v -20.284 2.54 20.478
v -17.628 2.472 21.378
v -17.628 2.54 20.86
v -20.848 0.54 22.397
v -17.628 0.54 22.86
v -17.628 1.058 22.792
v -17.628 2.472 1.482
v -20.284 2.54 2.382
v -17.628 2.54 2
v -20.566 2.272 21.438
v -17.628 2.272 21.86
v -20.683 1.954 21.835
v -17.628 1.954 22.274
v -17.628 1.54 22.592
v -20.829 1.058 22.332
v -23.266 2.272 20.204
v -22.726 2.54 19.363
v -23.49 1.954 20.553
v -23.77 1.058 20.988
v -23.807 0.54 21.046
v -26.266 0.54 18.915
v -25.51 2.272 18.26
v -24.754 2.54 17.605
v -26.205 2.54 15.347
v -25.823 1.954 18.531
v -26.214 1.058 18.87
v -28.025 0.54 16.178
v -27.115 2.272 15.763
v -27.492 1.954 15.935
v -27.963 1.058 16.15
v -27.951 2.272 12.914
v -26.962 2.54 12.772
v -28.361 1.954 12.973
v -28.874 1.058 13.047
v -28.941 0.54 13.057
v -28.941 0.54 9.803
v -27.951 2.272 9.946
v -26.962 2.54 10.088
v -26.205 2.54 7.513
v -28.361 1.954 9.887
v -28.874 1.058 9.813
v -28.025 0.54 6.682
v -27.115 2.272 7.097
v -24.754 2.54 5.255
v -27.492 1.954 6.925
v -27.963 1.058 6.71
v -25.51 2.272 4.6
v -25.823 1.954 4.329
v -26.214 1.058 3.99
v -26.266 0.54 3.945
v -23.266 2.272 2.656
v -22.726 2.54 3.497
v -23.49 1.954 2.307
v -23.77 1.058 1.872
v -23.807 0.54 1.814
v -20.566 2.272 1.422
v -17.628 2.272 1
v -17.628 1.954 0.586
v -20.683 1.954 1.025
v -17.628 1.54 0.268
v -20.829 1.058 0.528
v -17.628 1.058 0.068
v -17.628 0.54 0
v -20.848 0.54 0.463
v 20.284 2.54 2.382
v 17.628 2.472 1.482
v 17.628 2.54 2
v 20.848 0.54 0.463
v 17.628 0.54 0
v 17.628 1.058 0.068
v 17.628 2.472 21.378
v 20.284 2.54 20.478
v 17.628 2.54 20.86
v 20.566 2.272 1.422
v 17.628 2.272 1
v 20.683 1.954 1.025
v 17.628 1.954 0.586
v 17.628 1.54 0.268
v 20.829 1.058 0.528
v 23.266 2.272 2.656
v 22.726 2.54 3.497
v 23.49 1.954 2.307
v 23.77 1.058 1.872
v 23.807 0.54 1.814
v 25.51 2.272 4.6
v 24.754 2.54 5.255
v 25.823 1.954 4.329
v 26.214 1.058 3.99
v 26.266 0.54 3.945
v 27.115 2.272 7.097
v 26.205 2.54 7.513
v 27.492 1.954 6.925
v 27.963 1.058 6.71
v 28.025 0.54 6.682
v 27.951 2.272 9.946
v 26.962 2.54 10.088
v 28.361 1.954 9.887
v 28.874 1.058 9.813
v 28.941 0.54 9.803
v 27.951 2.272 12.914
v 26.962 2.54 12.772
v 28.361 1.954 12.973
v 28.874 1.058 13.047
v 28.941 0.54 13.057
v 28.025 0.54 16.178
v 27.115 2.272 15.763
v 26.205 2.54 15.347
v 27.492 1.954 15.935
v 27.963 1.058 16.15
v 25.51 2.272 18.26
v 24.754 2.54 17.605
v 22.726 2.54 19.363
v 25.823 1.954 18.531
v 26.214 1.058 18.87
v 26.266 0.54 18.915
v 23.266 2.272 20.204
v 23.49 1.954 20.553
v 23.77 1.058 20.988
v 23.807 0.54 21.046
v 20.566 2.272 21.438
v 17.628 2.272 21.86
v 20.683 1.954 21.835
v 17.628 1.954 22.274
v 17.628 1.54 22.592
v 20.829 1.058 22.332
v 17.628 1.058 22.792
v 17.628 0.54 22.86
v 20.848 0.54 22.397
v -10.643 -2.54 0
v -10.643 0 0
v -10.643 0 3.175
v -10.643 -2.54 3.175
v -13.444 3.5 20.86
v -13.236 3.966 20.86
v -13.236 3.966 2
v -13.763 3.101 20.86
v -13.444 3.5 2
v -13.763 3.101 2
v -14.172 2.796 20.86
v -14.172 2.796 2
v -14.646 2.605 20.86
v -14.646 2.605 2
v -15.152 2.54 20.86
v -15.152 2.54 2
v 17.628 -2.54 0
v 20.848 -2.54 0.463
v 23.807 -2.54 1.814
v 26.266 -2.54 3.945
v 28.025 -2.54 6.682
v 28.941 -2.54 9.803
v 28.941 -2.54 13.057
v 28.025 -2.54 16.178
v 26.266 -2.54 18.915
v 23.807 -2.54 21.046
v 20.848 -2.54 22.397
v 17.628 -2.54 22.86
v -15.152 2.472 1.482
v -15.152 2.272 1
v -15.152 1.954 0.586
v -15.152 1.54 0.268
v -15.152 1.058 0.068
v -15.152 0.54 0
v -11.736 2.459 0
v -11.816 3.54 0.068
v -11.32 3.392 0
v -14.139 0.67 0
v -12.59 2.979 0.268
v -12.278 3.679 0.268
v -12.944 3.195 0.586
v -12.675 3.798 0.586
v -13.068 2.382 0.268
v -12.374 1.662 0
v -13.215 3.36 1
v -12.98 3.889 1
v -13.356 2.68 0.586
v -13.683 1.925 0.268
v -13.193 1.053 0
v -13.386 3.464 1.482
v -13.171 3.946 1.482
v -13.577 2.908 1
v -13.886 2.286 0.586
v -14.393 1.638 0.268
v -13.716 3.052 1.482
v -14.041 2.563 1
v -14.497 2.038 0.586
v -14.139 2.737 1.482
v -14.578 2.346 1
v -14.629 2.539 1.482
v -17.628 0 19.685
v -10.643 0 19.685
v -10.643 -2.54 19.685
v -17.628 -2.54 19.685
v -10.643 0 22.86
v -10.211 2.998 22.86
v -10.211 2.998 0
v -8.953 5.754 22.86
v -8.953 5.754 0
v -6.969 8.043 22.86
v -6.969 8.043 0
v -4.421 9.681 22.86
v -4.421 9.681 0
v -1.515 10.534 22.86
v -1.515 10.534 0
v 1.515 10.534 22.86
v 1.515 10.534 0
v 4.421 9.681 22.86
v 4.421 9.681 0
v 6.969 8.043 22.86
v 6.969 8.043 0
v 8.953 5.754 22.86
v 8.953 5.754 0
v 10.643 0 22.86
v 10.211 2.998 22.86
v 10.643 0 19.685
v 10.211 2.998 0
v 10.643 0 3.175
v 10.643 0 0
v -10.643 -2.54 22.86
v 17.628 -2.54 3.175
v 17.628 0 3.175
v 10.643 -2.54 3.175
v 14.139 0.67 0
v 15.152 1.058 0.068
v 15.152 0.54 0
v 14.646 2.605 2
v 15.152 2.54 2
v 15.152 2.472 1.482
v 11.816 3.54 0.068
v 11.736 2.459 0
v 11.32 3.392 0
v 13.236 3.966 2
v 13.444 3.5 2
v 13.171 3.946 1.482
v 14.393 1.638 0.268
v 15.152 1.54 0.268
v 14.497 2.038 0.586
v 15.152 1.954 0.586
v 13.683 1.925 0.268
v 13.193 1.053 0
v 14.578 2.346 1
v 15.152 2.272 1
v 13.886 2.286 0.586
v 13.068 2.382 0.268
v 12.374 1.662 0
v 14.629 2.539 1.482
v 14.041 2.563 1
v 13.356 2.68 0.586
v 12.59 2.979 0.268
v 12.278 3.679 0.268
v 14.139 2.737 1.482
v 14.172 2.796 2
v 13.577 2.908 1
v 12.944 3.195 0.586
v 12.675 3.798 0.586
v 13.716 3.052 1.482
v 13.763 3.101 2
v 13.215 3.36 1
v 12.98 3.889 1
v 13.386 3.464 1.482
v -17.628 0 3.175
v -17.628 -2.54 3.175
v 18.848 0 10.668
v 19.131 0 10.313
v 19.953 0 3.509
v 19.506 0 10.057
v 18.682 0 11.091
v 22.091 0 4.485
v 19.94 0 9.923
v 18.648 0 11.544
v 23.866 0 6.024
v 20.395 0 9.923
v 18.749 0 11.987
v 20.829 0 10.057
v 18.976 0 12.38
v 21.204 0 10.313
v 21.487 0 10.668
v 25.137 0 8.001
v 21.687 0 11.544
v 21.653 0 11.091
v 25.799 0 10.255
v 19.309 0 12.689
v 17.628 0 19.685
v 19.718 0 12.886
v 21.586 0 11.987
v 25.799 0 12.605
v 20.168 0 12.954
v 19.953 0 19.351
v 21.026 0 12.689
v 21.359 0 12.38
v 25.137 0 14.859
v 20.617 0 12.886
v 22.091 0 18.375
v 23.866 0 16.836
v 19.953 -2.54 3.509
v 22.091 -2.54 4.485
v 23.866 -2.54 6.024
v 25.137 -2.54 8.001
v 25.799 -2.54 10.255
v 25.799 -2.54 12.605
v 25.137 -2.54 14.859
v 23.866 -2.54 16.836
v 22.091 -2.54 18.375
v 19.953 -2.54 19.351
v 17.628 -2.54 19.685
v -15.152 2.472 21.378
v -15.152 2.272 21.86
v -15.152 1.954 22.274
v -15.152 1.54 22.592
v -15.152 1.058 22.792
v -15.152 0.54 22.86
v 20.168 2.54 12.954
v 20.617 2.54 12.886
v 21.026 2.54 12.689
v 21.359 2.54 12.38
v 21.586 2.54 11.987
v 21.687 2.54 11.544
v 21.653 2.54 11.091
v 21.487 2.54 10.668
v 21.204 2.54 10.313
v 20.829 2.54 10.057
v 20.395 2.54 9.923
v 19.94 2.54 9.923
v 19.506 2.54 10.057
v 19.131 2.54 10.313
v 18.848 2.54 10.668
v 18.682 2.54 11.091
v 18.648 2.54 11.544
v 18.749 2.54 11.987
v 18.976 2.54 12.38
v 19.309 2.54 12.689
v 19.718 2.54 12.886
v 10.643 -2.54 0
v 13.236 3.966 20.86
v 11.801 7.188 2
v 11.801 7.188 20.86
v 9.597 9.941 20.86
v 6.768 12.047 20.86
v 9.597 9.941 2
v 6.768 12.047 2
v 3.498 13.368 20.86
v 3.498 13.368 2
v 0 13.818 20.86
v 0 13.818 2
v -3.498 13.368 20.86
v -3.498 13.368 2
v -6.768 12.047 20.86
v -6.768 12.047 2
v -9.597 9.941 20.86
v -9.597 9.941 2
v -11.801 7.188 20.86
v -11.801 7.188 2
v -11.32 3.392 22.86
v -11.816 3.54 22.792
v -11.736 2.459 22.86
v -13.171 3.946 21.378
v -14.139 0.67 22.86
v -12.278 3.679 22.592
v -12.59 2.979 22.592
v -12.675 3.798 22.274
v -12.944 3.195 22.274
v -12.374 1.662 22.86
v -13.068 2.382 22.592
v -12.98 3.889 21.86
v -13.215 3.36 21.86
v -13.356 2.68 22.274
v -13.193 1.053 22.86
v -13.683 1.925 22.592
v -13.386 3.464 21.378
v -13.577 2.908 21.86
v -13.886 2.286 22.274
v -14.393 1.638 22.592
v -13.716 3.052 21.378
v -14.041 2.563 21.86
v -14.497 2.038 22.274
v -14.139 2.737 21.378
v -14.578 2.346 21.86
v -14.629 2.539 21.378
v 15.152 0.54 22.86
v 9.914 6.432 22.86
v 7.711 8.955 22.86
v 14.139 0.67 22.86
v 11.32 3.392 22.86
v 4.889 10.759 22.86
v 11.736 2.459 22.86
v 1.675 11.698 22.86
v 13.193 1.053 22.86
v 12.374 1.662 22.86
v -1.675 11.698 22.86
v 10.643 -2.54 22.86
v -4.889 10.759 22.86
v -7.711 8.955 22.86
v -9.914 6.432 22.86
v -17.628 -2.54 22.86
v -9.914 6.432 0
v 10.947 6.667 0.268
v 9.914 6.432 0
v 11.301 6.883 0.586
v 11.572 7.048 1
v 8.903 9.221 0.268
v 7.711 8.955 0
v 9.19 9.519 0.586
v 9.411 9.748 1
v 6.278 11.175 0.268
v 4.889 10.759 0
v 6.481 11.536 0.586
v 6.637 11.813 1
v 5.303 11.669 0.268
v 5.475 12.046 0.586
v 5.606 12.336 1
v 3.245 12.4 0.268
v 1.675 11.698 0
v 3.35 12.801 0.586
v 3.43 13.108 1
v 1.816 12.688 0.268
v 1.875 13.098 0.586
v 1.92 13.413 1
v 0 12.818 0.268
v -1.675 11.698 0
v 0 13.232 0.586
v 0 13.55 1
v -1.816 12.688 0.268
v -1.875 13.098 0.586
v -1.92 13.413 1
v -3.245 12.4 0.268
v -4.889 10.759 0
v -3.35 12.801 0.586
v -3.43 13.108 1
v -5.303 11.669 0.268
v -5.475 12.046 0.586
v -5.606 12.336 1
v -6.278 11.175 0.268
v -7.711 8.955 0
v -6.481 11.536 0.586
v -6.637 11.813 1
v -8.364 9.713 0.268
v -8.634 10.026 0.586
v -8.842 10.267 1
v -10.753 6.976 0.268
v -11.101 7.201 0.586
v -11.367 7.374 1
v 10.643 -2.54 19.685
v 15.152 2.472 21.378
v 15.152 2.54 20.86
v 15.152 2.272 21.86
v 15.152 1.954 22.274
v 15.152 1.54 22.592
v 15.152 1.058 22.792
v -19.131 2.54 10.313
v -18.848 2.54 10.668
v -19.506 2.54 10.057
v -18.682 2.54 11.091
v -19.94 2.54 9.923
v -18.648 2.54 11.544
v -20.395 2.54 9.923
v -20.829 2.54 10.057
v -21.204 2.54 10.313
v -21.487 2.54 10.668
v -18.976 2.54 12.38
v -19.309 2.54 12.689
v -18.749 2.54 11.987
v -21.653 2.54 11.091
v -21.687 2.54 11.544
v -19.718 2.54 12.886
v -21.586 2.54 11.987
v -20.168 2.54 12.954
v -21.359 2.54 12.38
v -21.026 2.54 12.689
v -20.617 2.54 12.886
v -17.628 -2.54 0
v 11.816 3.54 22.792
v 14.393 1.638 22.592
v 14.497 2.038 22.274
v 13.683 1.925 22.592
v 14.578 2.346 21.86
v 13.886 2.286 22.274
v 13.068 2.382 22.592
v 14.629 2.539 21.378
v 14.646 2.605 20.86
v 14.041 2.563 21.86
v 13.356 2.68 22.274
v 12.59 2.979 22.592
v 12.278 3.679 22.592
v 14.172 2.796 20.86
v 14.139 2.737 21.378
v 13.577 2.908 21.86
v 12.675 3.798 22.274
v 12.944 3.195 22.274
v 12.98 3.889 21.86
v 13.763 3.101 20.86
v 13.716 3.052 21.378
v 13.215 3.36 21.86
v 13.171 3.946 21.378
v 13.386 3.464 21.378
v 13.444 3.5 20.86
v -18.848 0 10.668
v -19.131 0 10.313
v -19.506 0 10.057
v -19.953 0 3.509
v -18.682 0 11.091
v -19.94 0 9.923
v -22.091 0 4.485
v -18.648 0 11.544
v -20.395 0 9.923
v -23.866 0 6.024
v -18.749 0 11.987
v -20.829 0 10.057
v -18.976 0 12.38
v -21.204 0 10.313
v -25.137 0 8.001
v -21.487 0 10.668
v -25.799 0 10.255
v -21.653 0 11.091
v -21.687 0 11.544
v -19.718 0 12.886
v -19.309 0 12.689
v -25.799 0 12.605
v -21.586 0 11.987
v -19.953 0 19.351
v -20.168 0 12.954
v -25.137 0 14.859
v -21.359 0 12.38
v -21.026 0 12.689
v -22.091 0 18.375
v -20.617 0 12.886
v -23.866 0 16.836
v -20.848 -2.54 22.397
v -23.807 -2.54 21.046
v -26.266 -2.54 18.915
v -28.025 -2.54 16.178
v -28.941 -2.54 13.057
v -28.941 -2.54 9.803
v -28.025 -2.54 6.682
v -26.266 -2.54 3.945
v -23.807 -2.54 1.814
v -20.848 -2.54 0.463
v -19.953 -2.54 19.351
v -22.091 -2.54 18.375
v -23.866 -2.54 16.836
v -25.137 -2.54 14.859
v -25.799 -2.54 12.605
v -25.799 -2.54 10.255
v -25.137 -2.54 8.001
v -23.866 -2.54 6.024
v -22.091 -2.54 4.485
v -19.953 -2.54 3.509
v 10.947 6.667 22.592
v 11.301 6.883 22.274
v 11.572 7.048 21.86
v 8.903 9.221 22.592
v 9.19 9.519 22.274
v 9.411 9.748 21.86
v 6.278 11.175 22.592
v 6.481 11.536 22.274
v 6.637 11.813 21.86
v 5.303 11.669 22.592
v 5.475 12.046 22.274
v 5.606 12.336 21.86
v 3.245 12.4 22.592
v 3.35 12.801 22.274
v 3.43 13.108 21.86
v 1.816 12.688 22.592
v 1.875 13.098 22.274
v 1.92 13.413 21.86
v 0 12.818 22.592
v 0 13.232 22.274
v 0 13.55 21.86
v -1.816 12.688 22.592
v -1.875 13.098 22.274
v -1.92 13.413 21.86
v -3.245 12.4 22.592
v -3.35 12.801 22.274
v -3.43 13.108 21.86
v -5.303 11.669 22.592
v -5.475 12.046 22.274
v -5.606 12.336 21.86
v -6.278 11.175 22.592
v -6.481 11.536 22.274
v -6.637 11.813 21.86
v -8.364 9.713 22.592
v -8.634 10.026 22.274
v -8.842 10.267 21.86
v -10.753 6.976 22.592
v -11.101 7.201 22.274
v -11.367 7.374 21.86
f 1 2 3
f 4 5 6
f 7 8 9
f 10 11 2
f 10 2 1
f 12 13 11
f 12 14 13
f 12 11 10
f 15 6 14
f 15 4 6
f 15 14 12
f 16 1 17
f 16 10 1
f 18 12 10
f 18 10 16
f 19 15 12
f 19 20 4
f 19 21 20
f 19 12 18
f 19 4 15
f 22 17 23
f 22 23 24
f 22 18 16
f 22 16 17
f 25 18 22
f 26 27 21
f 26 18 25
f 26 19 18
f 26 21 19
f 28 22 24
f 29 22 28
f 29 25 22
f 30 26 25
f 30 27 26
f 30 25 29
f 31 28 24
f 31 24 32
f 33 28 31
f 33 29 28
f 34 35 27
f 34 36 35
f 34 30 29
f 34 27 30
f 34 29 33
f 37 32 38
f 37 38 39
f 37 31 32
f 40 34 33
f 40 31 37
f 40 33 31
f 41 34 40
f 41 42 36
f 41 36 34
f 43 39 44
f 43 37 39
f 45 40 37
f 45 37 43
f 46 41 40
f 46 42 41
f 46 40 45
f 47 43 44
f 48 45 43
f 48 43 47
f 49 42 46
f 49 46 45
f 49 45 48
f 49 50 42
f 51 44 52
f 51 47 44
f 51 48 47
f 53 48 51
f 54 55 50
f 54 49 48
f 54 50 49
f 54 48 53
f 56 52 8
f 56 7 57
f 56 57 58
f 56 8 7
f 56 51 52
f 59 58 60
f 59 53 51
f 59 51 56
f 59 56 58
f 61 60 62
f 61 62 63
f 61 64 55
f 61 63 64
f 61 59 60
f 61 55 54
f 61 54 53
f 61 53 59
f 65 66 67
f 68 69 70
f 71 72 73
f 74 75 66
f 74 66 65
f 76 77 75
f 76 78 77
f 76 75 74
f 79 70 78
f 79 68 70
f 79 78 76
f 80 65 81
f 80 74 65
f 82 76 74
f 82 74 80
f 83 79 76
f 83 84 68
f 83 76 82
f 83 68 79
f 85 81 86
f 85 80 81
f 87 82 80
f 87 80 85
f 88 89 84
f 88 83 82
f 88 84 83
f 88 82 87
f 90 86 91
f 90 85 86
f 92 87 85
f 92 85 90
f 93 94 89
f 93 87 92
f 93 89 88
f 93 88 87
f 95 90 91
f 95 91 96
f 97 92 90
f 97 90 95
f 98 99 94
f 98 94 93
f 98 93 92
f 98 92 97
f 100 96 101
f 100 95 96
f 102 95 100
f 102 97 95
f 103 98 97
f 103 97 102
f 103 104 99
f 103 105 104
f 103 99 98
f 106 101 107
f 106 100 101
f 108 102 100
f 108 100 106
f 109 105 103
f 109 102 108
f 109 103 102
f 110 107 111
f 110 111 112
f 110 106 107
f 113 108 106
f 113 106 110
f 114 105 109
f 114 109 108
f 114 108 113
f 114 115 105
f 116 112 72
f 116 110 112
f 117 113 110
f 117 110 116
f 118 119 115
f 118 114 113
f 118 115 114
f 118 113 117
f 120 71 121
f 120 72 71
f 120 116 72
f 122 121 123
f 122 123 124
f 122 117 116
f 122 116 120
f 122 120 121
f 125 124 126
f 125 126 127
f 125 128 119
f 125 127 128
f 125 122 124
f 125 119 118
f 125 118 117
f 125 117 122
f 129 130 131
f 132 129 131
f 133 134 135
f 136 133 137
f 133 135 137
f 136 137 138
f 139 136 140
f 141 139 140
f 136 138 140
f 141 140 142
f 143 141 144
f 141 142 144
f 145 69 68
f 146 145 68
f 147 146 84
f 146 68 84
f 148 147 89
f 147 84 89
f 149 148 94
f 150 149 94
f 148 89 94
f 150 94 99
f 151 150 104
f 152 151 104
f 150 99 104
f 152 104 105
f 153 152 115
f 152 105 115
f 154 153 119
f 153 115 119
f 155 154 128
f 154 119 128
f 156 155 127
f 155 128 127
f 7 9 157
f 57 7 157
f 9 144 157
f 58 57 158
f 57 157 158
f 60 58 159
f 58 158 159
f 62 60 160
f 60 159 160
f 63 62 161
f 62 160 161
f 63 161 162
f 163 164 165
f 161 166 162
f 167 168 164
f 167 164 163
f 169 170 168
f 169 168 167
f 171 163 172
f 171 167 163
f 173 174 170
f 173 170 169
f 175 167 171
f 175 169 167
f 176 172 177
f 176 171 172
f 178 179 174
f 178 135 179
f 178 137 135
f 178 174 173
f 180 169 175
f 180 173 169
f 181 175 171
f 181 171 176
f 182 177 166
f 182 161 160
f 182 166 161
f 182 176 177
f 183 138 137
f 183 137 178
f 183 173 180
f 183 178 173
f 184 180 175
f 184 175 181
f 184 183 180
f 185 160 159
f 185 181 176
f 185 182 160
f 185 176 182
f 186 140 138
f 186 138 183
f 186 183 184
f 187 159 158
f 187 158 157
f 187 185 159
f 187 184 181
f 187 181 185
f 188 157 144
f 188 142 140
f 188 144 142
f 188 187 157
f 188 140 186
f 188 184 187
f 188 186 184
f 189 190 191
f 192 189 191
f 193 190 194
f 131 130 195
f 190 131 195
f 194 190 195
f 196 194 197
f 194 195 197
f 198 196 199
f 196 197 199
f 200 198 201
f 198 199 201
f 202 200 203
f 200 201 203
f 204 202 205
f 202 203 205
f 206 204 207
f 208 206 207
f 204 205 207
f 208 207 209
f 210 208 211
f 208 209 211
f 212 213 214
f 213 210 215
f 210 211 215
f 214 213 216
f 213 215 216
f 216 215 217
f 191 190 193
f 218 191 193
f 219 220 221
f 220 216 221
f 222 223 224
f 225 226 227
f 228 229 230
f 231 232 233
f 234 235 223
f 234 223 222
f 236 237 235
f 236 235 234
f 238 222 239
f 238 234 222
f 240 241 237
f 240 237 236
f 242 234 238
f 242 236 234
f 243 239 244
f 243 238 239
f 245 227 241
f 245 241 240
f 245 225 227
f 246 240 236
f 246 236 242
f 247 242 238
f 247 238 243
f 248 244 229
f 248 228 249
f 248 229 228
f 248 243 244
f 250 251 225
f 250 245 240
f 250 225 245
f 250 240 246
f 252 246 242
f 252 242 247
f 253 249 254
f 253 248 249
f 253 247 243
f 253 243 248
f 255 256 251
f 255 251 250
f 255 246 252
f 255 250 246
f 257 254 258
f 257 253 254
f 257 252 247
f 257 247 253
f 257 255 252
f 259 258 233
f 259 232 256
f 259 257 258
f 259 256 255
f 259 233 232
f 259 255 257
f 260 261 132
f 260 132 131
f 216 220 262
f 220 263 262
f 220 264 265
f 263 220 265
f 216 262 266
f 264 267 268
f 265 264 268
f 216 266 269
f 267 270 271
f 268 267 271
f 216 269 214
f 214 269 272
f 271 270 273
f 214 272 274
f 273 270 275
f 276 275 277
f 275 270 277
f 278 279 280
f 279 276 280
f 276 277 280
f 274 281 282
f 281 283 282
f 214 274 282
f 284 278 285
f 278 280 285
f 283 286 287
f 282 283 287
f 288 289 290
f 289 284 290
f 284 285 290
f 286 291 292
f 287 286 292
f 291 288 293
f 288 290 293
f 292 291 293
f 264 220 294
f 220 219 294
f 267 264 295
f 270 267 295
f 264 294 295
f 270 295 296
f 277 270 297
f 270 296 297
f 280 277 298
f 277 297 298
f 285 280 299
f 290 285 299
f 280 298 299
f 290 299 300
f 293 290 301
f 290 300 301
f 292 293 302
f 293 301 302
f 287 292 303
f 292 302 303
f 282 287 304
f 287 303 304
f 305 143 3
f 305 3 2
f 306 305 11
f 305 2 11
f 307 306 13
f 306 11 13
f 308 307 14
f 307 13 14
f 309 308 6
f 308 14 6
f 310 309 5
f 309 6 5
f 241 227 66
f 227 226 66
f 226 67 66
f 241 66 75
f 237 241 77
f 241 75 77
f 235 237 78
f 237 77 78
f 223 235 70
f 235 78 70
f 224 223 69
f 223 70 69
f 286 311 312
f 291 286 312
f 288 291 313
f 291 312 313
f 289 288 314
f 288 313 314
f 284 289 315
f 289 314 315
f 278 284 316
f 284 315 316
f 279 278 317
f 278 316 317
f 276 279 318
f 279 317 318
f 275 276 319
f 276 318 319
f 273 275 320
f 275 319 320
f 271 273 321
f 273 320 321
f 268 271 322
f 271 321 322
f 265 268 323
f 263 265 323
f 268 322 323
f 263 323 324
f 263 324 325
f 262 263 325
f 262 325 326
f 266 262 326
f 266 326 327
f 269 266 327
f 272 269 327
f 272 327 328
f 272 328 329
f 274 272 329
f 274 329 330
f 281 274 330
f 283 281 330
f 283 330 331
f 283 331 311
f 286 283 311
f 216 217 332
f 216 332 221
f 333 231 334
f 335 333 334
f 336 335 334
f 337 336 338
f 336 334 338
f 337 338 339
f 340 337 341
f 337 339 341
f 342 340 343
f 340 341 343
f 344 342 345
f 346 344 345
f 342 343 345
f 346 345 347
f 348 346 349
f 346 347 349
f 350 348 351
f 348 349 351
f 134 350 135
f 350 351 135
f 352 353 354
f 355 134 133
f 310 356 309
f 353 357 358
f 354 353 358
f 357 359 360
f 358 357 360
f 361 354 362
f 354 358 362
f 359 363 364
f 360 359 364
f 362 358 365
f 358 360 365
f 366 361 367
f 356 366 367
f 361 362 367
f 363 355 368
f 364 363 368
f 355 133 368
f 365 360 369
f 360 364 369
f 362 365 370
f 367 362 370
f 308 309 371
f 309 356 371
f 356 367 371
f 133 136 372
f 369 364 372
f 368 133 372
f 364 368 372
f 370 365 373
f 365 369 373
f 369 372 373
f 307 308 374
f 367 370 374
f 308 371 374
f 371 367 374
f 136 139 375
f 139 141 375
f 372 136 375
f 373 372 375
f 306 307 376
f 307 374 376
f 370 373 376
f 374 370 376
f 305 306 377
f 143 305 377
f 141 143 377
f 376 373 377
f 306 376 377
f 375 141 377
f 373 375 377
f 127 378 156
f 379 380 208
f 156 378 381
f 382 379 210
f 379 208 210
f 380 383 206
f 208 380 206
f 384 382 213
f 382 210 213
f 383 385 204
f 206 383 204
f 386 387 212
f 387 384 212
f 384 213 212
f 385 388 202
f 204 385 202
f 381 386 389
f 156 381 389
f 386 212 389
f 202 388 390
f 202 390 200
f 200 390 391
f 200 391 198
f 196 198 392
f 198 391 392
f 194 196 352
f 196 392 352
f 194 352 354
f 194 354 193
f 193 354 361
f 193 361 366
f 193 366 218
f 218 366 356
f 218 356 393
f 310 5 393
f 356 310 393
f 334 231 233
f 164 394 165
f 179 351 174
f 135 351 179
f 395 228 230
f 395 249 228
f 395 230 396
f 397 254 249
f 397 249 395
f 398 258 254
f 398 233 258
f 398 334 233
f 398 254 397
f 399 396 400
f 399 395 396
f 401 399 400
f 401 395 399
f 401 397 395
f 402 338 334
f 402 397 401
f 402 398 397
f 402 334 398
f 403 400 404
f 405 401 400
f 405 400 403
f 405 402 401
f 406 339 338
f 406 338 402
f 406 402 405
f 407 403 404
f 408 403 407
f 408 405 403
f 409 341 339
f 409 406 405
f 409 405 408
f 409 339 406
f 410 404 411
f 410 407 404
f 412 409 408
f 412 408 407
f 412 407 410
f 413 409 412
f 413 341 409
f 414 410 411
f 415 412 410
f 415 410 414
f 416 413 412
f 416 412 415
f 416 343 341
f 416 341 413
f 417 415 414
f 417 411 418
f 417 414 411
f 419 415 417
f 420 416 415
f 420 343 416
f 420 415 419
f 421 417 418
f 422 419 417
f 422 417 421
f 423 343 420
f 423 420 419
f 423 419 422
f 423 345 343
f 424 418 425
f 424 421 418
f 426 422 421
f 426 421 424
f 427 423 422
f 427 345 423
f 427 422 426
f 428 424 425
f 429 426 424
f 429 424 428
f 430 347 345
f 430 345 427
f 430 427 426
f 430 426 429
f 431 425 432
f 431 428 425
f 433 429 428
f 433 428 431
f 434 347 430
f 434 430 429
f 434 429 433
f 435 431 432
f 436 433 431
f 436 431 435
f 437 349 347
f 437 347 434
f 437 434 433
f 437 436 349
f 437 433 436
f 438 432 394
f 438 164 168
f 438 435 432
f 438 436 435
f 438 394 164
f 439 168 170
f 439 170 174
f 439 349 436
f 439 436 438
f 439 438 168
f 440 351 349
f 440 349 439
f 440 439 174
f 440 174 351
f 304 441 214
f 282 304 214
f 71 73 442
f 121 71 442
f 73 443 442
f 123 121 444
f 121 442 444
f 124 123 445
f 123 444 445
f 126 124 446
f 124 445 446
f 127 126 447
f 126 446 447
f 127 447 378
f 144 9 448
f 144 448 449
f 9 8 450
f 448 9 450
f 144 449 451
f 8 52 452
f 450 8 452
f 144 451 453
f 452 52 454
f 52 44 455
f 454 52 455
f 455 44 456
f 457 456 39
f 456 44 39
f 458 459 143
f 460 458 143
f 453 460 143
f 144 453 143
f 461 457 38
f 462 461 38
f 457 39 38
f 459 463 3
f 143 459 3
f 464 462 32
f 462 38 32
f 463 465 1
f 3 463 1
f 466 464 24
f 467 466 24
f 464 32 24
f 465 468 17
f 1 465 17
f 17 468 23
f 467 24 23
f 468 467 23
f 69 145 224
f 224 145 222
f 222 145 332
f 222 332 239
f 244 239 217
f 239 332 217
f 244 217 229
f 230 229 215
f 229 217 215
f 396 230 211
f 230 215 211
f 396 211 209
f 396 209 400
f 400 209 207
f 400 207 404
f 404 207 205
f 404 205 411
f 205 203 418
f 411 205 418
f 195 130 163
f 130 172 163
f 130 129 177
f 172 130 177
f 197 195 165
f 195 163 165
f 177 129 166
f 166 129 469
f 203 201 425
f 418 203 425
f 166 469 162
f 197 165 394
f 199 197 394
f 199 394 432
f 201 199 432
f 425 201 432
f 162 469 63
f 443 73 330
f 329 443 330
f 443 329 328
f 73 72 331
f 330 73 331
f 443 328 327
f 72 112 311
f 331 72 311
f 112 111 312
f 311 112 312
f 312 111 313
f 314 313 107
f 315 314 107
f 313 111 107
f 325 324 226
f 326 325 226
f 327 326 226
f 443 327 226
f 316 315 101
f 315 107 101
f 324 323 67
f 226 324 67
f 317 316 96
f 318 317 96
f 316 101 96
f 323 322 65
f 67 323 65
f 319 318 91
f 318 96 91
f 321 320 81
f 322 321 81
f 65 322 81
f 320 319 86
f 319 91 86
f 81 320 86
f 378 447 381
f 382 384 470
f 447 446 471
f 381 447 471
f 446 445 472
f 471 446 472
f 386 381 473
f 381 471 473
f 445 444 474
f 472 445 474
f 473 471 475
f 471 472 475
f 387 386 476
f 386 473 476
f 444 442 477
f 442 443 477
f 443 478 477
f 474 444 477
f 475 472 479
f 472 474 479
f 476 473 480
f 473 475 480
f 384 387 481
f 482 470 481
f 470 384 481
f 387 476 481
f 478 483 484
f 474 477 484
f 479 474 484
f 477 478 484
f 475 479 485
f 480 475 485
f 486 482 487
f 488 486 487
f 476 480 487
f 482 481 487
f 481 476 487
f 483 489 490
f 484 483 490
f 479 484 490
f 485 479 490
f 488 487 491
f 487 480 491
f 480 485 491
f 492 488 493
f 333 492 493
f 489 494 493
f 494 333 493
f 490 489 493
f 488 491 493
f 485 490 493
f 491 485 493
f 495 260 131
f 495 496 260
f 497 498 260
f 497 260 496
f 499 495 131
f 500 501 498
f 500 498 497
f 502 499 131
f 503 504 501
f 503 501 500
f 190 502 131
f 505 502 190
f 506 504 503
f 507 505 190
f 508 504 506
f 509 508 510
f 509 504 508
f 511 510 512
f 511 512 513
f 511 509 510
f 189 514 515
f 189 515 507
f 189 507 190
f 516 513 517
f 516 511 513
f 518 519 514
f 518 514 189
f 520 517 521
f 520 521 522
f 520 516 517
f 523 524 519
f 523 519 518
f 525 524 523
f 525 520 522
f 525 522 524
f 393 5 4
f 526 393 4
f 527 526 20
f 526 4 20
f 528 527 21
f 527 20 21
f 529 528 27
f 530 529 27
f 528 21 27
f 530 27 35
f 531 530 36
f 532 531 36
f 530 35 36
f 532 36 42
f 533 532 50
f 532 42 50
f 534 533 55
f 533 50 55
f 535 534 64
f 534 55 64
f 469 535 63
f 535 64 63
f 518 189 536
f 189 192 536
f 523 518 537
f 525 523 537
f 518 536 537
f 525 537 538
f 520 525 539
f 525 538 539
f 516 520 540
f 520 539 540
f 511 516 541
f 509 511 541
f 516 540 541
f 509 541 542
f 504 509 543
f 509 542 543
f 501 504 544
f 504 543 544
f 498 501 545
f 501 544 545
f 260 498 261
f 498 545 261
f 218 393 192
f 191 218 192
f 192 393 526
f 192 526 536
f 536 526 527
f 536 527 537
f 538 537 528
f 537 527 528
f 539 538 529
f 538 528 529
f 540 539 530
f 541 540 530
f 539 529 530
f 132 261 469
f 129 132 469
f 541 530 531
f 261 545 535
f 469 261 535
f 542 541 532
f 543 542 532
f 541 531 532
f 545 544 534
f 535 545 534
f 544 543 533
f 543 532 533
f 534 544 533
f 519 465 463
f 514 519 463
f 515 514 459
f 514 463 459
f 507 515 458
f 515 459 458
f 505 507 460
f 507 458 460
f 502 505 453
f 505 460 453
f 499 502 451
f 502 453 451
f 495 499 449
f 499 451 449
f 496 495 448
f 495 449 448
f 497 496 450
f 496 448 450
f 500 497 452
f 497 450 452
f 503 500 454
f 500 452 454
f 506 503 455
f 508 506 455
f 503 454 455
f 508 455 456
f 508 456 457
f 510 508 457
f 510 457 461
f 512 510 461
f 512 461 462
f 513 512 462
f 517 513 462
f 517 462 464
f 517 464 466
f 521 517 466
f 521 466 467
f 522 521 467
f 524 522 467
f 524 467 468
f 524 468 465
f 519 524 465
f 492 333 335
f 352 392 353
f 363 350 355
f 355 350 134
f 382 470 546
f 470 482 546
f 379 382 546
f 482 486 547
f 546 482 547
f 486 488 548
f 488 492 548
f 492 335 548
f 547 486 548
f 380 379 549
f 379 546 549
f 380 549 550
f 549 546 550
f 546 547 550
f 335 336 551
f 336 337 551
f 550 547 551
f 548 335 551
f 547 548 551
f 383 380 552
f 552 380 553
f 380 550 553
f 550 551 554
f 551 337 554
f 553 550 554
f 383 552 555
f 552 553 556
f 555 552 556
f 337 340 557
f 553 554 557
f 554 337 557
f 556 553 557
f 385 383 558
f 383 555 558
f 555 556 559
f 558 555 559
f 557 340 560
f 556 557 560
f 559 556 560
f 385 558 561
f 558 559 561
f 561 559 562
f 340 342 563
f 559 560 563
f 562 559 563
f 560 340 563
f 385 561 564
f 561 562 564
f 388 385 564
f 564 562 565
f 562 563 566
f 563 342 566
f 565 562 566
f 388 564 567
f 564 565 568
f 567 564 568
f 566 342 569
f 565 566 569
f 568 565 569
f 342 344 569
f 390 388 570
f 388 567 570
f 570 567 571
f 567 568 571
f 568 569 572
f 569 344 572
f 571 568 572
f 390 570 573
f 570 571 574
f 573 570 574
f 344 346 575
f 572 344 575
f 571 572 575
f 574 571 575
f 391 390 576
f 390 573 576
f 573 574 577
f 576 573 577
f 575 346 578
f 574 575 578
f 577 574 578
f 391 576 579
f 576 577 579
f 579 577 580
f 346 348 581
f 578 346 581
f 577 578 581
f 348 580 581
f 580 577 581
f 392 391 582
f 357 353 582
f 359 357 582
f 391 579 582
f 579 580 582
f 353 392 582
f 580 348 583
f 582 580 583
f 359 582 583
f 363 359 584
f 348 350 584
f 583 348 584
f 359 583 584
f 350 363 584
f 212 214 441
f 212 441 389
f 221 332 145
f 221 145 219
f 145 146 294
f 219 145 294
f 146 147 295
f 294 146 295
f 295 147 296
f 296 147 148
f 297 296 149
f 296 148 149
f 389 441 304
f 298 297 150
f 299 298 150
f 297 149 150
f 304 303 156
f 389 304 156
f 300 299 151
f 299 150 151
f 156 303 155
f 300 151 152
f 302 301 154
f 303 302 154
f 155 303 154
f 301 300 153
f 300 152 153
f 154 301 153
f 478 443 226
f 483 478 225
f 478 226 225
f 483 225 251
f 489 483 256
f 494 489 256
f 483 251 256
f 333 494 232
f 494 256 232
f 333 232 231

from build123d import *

# Parameters (mm, degrees)
BOSS_EXTRUDE1_DEPTH      = 22.86
BOSS_EXTRUDE8_DEPTH      = 2.54
BOSS_EXTRUDE8_DEPTH_BACK = 2.54
SKETCH9_W                = 3.175
SKETCH9_H                = 22.86
BOSS_EXTRUDE9_DEPTH      = 2.54
BOSS_EXTRUDE9_DEPTH_BACK = 2.54
SKETCH10_W               = 3.175
SKETCH10_H               = 22.86
BOSS_EXTRUDE10_DEPTH     = 3.81
BOSS_EXTRUDE11_DEPTH     = 3.81
REVOLVE1_ANGLE           = 180
REVOLVE2_ANGLE           = 180
SKETCH22_W               = 16.51
SKETCH22_H               = 2.54
CUT_EXTRUDE1_DEPTH       = 3.81
SKETCH23_W               = 16.51
SKETCH23_H               = 2.54
CUT_EXTRUDE2_DEPTH       = 3.81
SKETCH24_R               = 1.524
CUT_EXTRUDE3_DEPTH       = 3.81
FILLET1_R                = 2


with BuildPart() as part:
    # Sketch1 → Boss-Extrude1 (new body)
    with BuildSketch(Plane.XY):
        with BuildLine():
            Line((-13.8176, 0), (-10.6426, 0))
            ThreePointArc((-10.6426, 0), (0, 10.6426), (10.6426, 0))
            Line((10.6426, 0), (13.8176, 0))
            ThreePointArc((13.8176, 0), (0, 13.8176), (-13.8176, 0))
        make_face()
    extrude(amount=BOSS_EXTRUDE1_DEPTH)

    # Sketch9 → Boss-Extrude8 (add, two sides: drawn at the far end of the back side and taken through both)
    with BuildSketch(Plane.XZ.offset(-BOSS_EXTRUDE8_DEPTH_BACK)):
        with Locations((-12.2301, 11.43)):
            Rectangle(SKETCH9_W, SKETCH9_H)
    extrude(amount=BOSS_EXTRUDE8_DEPTH + BOSS_EXTRUDE8_DEPTH_BACK)

    # Sketch10 → Boss-Extrude9 (add, two sides: drawn at the far end of the back side and taken through both)
    with BuildSketch(Plane.XZ.offset(-BOSS_EXTRUDE9_DEPTH_BACK)):
        with Locations((12.2301, 11.43)):
            Rectangle(SKETCH10_W, SKETCH10_H)
    extrude(amount=BOSS_EXTRUDE9_DEPTH + BOSS_EXTRUDE9_DEPTH_BACK)

    # Sketch11 → Boss-Extrude10 (add)
    with BuildSketch(Plane.ZY.offset(13.8176)):
        Polygon((22.86, 2.54), (0, 2.54), (0, 0), (0, -2.54), (3.175, -2.54), (3.175, 0), (19.685, 0), (19.685, -2.54), (22.86, -2.54), align=None)
    extrude(amount=BOSS_EXTRUDE10_DEPTH)

    # Sketch19 → Boss-Extrude11 (add)
    with BuildSketch(Plane(origin=(13.8176, 0, 0), x_dir=(0, 0, -1), z_dir=(1, 0, 0))):
        Polygon((-19.685, -2.54), (-19.685, 0), (-3.175, 0), (-3.175, -2.54), (0, -2.54), (0, 2.54), (-22.86, 2.54), (-22.86, -2.54), align=None)
    extrude(amount=BOSS_EXTRUDE11_DEPTH)

    # Sketch20 → Revolve1 (revolve)
    with BuildSketch(Plane.ZY.offset(17.6276)):
        Polygon((11.43, 2.54), (11.43, 0), (19.685, 0), (19.685, -2.54), (22.86, -2.54), (22.86, 2.54), align=None)
    revolve(axis=Axis((-17.6276, 2.54, 11.43), (0, -1, 0)), revolution_arc=REVOLVE1_ANGLE)

    # Sketch21 → Revolve2 (revolve)
    with BuildSketch(Plane(origin=(17.6276, 0, 0), x_dir=(0, 0, -1), z_dir=(1, 0, 0))):
        Polygon((-11.43, 2.54), (-11.43, 0), (-3.175, 0), (-3.175, -2.54), (0, -2.54), (0, 2.54), align=None)
    revolve(axis=Axis((17.6276, 2.54, 11.43), (0, -1, 0)), revolution_arc=REVOLVE2_ANGLE)

    # Sketch22 → Cut-Extrude1 (cut)
    with BuildSketch(Plane.ZY.offset(13.8176)):
        with Locations((11.43, -1.27)):
            Rectangle(SKETCH22_W, SKETCH22_H)
    extrude(amount=-CUT_EXTRUDE1_DEPTH, mode=Mode.SUBTRACT)

    # Sketch23 → Cut-Extrude2 (cut)
    with BuildSketch(Plane(origin=(13.8176, 0, 0), x_dir=(0, 0, -1), z_dir=(1, 0, 0))):
        with Locations((-11.43, -1.27)):
            Rectangle(SKETCH23_W, SKETCH23_H)
    extrude(amount=-CUT_EXTRUDE2_DEPTH, mode=Mode.SUBTRACT)

    # Sketch24 → Cut-Extrude3 (cut)
    with BuildSketch(Plane(origin=(0, 2.54, 0), x_dir=(1, 0, 0), z_dir=(0, 1, 0))):
        with Locations((-20.1676, -11.43)):
            Circle(SKETCH24_R)
        with Locations((20.1676, -11.43)):
            Circle(SKETCH24_R)
    extrude(amount=-CUT_EXTRUDE3_DEPTH, mode=Mode.SUBTRACT)

    # Fillet1
    fillet1_edges = [part.edges().sort_by_distance(p)[0] for p in [
        (0, 13.8176, 0),
        (0, 13.8176, 22.86),
        (15.604868947, 2.54, 22.86),
        (15.604868947, 2.54, 0),
        (-15.604868947, 2.54, 0),
        (-15.604868947, 2.54, 22.86),
        (13.582137894, 2.54, 11.43),
        (-13.582137894, 2.54, 11.43),
        (29.0576, 2.54, 11.43),
        (-29.0576, 2.54, 11.43),
    ]]
    fillet(fillet1_edges, radius=FILLET1_R)


solid = part.part
